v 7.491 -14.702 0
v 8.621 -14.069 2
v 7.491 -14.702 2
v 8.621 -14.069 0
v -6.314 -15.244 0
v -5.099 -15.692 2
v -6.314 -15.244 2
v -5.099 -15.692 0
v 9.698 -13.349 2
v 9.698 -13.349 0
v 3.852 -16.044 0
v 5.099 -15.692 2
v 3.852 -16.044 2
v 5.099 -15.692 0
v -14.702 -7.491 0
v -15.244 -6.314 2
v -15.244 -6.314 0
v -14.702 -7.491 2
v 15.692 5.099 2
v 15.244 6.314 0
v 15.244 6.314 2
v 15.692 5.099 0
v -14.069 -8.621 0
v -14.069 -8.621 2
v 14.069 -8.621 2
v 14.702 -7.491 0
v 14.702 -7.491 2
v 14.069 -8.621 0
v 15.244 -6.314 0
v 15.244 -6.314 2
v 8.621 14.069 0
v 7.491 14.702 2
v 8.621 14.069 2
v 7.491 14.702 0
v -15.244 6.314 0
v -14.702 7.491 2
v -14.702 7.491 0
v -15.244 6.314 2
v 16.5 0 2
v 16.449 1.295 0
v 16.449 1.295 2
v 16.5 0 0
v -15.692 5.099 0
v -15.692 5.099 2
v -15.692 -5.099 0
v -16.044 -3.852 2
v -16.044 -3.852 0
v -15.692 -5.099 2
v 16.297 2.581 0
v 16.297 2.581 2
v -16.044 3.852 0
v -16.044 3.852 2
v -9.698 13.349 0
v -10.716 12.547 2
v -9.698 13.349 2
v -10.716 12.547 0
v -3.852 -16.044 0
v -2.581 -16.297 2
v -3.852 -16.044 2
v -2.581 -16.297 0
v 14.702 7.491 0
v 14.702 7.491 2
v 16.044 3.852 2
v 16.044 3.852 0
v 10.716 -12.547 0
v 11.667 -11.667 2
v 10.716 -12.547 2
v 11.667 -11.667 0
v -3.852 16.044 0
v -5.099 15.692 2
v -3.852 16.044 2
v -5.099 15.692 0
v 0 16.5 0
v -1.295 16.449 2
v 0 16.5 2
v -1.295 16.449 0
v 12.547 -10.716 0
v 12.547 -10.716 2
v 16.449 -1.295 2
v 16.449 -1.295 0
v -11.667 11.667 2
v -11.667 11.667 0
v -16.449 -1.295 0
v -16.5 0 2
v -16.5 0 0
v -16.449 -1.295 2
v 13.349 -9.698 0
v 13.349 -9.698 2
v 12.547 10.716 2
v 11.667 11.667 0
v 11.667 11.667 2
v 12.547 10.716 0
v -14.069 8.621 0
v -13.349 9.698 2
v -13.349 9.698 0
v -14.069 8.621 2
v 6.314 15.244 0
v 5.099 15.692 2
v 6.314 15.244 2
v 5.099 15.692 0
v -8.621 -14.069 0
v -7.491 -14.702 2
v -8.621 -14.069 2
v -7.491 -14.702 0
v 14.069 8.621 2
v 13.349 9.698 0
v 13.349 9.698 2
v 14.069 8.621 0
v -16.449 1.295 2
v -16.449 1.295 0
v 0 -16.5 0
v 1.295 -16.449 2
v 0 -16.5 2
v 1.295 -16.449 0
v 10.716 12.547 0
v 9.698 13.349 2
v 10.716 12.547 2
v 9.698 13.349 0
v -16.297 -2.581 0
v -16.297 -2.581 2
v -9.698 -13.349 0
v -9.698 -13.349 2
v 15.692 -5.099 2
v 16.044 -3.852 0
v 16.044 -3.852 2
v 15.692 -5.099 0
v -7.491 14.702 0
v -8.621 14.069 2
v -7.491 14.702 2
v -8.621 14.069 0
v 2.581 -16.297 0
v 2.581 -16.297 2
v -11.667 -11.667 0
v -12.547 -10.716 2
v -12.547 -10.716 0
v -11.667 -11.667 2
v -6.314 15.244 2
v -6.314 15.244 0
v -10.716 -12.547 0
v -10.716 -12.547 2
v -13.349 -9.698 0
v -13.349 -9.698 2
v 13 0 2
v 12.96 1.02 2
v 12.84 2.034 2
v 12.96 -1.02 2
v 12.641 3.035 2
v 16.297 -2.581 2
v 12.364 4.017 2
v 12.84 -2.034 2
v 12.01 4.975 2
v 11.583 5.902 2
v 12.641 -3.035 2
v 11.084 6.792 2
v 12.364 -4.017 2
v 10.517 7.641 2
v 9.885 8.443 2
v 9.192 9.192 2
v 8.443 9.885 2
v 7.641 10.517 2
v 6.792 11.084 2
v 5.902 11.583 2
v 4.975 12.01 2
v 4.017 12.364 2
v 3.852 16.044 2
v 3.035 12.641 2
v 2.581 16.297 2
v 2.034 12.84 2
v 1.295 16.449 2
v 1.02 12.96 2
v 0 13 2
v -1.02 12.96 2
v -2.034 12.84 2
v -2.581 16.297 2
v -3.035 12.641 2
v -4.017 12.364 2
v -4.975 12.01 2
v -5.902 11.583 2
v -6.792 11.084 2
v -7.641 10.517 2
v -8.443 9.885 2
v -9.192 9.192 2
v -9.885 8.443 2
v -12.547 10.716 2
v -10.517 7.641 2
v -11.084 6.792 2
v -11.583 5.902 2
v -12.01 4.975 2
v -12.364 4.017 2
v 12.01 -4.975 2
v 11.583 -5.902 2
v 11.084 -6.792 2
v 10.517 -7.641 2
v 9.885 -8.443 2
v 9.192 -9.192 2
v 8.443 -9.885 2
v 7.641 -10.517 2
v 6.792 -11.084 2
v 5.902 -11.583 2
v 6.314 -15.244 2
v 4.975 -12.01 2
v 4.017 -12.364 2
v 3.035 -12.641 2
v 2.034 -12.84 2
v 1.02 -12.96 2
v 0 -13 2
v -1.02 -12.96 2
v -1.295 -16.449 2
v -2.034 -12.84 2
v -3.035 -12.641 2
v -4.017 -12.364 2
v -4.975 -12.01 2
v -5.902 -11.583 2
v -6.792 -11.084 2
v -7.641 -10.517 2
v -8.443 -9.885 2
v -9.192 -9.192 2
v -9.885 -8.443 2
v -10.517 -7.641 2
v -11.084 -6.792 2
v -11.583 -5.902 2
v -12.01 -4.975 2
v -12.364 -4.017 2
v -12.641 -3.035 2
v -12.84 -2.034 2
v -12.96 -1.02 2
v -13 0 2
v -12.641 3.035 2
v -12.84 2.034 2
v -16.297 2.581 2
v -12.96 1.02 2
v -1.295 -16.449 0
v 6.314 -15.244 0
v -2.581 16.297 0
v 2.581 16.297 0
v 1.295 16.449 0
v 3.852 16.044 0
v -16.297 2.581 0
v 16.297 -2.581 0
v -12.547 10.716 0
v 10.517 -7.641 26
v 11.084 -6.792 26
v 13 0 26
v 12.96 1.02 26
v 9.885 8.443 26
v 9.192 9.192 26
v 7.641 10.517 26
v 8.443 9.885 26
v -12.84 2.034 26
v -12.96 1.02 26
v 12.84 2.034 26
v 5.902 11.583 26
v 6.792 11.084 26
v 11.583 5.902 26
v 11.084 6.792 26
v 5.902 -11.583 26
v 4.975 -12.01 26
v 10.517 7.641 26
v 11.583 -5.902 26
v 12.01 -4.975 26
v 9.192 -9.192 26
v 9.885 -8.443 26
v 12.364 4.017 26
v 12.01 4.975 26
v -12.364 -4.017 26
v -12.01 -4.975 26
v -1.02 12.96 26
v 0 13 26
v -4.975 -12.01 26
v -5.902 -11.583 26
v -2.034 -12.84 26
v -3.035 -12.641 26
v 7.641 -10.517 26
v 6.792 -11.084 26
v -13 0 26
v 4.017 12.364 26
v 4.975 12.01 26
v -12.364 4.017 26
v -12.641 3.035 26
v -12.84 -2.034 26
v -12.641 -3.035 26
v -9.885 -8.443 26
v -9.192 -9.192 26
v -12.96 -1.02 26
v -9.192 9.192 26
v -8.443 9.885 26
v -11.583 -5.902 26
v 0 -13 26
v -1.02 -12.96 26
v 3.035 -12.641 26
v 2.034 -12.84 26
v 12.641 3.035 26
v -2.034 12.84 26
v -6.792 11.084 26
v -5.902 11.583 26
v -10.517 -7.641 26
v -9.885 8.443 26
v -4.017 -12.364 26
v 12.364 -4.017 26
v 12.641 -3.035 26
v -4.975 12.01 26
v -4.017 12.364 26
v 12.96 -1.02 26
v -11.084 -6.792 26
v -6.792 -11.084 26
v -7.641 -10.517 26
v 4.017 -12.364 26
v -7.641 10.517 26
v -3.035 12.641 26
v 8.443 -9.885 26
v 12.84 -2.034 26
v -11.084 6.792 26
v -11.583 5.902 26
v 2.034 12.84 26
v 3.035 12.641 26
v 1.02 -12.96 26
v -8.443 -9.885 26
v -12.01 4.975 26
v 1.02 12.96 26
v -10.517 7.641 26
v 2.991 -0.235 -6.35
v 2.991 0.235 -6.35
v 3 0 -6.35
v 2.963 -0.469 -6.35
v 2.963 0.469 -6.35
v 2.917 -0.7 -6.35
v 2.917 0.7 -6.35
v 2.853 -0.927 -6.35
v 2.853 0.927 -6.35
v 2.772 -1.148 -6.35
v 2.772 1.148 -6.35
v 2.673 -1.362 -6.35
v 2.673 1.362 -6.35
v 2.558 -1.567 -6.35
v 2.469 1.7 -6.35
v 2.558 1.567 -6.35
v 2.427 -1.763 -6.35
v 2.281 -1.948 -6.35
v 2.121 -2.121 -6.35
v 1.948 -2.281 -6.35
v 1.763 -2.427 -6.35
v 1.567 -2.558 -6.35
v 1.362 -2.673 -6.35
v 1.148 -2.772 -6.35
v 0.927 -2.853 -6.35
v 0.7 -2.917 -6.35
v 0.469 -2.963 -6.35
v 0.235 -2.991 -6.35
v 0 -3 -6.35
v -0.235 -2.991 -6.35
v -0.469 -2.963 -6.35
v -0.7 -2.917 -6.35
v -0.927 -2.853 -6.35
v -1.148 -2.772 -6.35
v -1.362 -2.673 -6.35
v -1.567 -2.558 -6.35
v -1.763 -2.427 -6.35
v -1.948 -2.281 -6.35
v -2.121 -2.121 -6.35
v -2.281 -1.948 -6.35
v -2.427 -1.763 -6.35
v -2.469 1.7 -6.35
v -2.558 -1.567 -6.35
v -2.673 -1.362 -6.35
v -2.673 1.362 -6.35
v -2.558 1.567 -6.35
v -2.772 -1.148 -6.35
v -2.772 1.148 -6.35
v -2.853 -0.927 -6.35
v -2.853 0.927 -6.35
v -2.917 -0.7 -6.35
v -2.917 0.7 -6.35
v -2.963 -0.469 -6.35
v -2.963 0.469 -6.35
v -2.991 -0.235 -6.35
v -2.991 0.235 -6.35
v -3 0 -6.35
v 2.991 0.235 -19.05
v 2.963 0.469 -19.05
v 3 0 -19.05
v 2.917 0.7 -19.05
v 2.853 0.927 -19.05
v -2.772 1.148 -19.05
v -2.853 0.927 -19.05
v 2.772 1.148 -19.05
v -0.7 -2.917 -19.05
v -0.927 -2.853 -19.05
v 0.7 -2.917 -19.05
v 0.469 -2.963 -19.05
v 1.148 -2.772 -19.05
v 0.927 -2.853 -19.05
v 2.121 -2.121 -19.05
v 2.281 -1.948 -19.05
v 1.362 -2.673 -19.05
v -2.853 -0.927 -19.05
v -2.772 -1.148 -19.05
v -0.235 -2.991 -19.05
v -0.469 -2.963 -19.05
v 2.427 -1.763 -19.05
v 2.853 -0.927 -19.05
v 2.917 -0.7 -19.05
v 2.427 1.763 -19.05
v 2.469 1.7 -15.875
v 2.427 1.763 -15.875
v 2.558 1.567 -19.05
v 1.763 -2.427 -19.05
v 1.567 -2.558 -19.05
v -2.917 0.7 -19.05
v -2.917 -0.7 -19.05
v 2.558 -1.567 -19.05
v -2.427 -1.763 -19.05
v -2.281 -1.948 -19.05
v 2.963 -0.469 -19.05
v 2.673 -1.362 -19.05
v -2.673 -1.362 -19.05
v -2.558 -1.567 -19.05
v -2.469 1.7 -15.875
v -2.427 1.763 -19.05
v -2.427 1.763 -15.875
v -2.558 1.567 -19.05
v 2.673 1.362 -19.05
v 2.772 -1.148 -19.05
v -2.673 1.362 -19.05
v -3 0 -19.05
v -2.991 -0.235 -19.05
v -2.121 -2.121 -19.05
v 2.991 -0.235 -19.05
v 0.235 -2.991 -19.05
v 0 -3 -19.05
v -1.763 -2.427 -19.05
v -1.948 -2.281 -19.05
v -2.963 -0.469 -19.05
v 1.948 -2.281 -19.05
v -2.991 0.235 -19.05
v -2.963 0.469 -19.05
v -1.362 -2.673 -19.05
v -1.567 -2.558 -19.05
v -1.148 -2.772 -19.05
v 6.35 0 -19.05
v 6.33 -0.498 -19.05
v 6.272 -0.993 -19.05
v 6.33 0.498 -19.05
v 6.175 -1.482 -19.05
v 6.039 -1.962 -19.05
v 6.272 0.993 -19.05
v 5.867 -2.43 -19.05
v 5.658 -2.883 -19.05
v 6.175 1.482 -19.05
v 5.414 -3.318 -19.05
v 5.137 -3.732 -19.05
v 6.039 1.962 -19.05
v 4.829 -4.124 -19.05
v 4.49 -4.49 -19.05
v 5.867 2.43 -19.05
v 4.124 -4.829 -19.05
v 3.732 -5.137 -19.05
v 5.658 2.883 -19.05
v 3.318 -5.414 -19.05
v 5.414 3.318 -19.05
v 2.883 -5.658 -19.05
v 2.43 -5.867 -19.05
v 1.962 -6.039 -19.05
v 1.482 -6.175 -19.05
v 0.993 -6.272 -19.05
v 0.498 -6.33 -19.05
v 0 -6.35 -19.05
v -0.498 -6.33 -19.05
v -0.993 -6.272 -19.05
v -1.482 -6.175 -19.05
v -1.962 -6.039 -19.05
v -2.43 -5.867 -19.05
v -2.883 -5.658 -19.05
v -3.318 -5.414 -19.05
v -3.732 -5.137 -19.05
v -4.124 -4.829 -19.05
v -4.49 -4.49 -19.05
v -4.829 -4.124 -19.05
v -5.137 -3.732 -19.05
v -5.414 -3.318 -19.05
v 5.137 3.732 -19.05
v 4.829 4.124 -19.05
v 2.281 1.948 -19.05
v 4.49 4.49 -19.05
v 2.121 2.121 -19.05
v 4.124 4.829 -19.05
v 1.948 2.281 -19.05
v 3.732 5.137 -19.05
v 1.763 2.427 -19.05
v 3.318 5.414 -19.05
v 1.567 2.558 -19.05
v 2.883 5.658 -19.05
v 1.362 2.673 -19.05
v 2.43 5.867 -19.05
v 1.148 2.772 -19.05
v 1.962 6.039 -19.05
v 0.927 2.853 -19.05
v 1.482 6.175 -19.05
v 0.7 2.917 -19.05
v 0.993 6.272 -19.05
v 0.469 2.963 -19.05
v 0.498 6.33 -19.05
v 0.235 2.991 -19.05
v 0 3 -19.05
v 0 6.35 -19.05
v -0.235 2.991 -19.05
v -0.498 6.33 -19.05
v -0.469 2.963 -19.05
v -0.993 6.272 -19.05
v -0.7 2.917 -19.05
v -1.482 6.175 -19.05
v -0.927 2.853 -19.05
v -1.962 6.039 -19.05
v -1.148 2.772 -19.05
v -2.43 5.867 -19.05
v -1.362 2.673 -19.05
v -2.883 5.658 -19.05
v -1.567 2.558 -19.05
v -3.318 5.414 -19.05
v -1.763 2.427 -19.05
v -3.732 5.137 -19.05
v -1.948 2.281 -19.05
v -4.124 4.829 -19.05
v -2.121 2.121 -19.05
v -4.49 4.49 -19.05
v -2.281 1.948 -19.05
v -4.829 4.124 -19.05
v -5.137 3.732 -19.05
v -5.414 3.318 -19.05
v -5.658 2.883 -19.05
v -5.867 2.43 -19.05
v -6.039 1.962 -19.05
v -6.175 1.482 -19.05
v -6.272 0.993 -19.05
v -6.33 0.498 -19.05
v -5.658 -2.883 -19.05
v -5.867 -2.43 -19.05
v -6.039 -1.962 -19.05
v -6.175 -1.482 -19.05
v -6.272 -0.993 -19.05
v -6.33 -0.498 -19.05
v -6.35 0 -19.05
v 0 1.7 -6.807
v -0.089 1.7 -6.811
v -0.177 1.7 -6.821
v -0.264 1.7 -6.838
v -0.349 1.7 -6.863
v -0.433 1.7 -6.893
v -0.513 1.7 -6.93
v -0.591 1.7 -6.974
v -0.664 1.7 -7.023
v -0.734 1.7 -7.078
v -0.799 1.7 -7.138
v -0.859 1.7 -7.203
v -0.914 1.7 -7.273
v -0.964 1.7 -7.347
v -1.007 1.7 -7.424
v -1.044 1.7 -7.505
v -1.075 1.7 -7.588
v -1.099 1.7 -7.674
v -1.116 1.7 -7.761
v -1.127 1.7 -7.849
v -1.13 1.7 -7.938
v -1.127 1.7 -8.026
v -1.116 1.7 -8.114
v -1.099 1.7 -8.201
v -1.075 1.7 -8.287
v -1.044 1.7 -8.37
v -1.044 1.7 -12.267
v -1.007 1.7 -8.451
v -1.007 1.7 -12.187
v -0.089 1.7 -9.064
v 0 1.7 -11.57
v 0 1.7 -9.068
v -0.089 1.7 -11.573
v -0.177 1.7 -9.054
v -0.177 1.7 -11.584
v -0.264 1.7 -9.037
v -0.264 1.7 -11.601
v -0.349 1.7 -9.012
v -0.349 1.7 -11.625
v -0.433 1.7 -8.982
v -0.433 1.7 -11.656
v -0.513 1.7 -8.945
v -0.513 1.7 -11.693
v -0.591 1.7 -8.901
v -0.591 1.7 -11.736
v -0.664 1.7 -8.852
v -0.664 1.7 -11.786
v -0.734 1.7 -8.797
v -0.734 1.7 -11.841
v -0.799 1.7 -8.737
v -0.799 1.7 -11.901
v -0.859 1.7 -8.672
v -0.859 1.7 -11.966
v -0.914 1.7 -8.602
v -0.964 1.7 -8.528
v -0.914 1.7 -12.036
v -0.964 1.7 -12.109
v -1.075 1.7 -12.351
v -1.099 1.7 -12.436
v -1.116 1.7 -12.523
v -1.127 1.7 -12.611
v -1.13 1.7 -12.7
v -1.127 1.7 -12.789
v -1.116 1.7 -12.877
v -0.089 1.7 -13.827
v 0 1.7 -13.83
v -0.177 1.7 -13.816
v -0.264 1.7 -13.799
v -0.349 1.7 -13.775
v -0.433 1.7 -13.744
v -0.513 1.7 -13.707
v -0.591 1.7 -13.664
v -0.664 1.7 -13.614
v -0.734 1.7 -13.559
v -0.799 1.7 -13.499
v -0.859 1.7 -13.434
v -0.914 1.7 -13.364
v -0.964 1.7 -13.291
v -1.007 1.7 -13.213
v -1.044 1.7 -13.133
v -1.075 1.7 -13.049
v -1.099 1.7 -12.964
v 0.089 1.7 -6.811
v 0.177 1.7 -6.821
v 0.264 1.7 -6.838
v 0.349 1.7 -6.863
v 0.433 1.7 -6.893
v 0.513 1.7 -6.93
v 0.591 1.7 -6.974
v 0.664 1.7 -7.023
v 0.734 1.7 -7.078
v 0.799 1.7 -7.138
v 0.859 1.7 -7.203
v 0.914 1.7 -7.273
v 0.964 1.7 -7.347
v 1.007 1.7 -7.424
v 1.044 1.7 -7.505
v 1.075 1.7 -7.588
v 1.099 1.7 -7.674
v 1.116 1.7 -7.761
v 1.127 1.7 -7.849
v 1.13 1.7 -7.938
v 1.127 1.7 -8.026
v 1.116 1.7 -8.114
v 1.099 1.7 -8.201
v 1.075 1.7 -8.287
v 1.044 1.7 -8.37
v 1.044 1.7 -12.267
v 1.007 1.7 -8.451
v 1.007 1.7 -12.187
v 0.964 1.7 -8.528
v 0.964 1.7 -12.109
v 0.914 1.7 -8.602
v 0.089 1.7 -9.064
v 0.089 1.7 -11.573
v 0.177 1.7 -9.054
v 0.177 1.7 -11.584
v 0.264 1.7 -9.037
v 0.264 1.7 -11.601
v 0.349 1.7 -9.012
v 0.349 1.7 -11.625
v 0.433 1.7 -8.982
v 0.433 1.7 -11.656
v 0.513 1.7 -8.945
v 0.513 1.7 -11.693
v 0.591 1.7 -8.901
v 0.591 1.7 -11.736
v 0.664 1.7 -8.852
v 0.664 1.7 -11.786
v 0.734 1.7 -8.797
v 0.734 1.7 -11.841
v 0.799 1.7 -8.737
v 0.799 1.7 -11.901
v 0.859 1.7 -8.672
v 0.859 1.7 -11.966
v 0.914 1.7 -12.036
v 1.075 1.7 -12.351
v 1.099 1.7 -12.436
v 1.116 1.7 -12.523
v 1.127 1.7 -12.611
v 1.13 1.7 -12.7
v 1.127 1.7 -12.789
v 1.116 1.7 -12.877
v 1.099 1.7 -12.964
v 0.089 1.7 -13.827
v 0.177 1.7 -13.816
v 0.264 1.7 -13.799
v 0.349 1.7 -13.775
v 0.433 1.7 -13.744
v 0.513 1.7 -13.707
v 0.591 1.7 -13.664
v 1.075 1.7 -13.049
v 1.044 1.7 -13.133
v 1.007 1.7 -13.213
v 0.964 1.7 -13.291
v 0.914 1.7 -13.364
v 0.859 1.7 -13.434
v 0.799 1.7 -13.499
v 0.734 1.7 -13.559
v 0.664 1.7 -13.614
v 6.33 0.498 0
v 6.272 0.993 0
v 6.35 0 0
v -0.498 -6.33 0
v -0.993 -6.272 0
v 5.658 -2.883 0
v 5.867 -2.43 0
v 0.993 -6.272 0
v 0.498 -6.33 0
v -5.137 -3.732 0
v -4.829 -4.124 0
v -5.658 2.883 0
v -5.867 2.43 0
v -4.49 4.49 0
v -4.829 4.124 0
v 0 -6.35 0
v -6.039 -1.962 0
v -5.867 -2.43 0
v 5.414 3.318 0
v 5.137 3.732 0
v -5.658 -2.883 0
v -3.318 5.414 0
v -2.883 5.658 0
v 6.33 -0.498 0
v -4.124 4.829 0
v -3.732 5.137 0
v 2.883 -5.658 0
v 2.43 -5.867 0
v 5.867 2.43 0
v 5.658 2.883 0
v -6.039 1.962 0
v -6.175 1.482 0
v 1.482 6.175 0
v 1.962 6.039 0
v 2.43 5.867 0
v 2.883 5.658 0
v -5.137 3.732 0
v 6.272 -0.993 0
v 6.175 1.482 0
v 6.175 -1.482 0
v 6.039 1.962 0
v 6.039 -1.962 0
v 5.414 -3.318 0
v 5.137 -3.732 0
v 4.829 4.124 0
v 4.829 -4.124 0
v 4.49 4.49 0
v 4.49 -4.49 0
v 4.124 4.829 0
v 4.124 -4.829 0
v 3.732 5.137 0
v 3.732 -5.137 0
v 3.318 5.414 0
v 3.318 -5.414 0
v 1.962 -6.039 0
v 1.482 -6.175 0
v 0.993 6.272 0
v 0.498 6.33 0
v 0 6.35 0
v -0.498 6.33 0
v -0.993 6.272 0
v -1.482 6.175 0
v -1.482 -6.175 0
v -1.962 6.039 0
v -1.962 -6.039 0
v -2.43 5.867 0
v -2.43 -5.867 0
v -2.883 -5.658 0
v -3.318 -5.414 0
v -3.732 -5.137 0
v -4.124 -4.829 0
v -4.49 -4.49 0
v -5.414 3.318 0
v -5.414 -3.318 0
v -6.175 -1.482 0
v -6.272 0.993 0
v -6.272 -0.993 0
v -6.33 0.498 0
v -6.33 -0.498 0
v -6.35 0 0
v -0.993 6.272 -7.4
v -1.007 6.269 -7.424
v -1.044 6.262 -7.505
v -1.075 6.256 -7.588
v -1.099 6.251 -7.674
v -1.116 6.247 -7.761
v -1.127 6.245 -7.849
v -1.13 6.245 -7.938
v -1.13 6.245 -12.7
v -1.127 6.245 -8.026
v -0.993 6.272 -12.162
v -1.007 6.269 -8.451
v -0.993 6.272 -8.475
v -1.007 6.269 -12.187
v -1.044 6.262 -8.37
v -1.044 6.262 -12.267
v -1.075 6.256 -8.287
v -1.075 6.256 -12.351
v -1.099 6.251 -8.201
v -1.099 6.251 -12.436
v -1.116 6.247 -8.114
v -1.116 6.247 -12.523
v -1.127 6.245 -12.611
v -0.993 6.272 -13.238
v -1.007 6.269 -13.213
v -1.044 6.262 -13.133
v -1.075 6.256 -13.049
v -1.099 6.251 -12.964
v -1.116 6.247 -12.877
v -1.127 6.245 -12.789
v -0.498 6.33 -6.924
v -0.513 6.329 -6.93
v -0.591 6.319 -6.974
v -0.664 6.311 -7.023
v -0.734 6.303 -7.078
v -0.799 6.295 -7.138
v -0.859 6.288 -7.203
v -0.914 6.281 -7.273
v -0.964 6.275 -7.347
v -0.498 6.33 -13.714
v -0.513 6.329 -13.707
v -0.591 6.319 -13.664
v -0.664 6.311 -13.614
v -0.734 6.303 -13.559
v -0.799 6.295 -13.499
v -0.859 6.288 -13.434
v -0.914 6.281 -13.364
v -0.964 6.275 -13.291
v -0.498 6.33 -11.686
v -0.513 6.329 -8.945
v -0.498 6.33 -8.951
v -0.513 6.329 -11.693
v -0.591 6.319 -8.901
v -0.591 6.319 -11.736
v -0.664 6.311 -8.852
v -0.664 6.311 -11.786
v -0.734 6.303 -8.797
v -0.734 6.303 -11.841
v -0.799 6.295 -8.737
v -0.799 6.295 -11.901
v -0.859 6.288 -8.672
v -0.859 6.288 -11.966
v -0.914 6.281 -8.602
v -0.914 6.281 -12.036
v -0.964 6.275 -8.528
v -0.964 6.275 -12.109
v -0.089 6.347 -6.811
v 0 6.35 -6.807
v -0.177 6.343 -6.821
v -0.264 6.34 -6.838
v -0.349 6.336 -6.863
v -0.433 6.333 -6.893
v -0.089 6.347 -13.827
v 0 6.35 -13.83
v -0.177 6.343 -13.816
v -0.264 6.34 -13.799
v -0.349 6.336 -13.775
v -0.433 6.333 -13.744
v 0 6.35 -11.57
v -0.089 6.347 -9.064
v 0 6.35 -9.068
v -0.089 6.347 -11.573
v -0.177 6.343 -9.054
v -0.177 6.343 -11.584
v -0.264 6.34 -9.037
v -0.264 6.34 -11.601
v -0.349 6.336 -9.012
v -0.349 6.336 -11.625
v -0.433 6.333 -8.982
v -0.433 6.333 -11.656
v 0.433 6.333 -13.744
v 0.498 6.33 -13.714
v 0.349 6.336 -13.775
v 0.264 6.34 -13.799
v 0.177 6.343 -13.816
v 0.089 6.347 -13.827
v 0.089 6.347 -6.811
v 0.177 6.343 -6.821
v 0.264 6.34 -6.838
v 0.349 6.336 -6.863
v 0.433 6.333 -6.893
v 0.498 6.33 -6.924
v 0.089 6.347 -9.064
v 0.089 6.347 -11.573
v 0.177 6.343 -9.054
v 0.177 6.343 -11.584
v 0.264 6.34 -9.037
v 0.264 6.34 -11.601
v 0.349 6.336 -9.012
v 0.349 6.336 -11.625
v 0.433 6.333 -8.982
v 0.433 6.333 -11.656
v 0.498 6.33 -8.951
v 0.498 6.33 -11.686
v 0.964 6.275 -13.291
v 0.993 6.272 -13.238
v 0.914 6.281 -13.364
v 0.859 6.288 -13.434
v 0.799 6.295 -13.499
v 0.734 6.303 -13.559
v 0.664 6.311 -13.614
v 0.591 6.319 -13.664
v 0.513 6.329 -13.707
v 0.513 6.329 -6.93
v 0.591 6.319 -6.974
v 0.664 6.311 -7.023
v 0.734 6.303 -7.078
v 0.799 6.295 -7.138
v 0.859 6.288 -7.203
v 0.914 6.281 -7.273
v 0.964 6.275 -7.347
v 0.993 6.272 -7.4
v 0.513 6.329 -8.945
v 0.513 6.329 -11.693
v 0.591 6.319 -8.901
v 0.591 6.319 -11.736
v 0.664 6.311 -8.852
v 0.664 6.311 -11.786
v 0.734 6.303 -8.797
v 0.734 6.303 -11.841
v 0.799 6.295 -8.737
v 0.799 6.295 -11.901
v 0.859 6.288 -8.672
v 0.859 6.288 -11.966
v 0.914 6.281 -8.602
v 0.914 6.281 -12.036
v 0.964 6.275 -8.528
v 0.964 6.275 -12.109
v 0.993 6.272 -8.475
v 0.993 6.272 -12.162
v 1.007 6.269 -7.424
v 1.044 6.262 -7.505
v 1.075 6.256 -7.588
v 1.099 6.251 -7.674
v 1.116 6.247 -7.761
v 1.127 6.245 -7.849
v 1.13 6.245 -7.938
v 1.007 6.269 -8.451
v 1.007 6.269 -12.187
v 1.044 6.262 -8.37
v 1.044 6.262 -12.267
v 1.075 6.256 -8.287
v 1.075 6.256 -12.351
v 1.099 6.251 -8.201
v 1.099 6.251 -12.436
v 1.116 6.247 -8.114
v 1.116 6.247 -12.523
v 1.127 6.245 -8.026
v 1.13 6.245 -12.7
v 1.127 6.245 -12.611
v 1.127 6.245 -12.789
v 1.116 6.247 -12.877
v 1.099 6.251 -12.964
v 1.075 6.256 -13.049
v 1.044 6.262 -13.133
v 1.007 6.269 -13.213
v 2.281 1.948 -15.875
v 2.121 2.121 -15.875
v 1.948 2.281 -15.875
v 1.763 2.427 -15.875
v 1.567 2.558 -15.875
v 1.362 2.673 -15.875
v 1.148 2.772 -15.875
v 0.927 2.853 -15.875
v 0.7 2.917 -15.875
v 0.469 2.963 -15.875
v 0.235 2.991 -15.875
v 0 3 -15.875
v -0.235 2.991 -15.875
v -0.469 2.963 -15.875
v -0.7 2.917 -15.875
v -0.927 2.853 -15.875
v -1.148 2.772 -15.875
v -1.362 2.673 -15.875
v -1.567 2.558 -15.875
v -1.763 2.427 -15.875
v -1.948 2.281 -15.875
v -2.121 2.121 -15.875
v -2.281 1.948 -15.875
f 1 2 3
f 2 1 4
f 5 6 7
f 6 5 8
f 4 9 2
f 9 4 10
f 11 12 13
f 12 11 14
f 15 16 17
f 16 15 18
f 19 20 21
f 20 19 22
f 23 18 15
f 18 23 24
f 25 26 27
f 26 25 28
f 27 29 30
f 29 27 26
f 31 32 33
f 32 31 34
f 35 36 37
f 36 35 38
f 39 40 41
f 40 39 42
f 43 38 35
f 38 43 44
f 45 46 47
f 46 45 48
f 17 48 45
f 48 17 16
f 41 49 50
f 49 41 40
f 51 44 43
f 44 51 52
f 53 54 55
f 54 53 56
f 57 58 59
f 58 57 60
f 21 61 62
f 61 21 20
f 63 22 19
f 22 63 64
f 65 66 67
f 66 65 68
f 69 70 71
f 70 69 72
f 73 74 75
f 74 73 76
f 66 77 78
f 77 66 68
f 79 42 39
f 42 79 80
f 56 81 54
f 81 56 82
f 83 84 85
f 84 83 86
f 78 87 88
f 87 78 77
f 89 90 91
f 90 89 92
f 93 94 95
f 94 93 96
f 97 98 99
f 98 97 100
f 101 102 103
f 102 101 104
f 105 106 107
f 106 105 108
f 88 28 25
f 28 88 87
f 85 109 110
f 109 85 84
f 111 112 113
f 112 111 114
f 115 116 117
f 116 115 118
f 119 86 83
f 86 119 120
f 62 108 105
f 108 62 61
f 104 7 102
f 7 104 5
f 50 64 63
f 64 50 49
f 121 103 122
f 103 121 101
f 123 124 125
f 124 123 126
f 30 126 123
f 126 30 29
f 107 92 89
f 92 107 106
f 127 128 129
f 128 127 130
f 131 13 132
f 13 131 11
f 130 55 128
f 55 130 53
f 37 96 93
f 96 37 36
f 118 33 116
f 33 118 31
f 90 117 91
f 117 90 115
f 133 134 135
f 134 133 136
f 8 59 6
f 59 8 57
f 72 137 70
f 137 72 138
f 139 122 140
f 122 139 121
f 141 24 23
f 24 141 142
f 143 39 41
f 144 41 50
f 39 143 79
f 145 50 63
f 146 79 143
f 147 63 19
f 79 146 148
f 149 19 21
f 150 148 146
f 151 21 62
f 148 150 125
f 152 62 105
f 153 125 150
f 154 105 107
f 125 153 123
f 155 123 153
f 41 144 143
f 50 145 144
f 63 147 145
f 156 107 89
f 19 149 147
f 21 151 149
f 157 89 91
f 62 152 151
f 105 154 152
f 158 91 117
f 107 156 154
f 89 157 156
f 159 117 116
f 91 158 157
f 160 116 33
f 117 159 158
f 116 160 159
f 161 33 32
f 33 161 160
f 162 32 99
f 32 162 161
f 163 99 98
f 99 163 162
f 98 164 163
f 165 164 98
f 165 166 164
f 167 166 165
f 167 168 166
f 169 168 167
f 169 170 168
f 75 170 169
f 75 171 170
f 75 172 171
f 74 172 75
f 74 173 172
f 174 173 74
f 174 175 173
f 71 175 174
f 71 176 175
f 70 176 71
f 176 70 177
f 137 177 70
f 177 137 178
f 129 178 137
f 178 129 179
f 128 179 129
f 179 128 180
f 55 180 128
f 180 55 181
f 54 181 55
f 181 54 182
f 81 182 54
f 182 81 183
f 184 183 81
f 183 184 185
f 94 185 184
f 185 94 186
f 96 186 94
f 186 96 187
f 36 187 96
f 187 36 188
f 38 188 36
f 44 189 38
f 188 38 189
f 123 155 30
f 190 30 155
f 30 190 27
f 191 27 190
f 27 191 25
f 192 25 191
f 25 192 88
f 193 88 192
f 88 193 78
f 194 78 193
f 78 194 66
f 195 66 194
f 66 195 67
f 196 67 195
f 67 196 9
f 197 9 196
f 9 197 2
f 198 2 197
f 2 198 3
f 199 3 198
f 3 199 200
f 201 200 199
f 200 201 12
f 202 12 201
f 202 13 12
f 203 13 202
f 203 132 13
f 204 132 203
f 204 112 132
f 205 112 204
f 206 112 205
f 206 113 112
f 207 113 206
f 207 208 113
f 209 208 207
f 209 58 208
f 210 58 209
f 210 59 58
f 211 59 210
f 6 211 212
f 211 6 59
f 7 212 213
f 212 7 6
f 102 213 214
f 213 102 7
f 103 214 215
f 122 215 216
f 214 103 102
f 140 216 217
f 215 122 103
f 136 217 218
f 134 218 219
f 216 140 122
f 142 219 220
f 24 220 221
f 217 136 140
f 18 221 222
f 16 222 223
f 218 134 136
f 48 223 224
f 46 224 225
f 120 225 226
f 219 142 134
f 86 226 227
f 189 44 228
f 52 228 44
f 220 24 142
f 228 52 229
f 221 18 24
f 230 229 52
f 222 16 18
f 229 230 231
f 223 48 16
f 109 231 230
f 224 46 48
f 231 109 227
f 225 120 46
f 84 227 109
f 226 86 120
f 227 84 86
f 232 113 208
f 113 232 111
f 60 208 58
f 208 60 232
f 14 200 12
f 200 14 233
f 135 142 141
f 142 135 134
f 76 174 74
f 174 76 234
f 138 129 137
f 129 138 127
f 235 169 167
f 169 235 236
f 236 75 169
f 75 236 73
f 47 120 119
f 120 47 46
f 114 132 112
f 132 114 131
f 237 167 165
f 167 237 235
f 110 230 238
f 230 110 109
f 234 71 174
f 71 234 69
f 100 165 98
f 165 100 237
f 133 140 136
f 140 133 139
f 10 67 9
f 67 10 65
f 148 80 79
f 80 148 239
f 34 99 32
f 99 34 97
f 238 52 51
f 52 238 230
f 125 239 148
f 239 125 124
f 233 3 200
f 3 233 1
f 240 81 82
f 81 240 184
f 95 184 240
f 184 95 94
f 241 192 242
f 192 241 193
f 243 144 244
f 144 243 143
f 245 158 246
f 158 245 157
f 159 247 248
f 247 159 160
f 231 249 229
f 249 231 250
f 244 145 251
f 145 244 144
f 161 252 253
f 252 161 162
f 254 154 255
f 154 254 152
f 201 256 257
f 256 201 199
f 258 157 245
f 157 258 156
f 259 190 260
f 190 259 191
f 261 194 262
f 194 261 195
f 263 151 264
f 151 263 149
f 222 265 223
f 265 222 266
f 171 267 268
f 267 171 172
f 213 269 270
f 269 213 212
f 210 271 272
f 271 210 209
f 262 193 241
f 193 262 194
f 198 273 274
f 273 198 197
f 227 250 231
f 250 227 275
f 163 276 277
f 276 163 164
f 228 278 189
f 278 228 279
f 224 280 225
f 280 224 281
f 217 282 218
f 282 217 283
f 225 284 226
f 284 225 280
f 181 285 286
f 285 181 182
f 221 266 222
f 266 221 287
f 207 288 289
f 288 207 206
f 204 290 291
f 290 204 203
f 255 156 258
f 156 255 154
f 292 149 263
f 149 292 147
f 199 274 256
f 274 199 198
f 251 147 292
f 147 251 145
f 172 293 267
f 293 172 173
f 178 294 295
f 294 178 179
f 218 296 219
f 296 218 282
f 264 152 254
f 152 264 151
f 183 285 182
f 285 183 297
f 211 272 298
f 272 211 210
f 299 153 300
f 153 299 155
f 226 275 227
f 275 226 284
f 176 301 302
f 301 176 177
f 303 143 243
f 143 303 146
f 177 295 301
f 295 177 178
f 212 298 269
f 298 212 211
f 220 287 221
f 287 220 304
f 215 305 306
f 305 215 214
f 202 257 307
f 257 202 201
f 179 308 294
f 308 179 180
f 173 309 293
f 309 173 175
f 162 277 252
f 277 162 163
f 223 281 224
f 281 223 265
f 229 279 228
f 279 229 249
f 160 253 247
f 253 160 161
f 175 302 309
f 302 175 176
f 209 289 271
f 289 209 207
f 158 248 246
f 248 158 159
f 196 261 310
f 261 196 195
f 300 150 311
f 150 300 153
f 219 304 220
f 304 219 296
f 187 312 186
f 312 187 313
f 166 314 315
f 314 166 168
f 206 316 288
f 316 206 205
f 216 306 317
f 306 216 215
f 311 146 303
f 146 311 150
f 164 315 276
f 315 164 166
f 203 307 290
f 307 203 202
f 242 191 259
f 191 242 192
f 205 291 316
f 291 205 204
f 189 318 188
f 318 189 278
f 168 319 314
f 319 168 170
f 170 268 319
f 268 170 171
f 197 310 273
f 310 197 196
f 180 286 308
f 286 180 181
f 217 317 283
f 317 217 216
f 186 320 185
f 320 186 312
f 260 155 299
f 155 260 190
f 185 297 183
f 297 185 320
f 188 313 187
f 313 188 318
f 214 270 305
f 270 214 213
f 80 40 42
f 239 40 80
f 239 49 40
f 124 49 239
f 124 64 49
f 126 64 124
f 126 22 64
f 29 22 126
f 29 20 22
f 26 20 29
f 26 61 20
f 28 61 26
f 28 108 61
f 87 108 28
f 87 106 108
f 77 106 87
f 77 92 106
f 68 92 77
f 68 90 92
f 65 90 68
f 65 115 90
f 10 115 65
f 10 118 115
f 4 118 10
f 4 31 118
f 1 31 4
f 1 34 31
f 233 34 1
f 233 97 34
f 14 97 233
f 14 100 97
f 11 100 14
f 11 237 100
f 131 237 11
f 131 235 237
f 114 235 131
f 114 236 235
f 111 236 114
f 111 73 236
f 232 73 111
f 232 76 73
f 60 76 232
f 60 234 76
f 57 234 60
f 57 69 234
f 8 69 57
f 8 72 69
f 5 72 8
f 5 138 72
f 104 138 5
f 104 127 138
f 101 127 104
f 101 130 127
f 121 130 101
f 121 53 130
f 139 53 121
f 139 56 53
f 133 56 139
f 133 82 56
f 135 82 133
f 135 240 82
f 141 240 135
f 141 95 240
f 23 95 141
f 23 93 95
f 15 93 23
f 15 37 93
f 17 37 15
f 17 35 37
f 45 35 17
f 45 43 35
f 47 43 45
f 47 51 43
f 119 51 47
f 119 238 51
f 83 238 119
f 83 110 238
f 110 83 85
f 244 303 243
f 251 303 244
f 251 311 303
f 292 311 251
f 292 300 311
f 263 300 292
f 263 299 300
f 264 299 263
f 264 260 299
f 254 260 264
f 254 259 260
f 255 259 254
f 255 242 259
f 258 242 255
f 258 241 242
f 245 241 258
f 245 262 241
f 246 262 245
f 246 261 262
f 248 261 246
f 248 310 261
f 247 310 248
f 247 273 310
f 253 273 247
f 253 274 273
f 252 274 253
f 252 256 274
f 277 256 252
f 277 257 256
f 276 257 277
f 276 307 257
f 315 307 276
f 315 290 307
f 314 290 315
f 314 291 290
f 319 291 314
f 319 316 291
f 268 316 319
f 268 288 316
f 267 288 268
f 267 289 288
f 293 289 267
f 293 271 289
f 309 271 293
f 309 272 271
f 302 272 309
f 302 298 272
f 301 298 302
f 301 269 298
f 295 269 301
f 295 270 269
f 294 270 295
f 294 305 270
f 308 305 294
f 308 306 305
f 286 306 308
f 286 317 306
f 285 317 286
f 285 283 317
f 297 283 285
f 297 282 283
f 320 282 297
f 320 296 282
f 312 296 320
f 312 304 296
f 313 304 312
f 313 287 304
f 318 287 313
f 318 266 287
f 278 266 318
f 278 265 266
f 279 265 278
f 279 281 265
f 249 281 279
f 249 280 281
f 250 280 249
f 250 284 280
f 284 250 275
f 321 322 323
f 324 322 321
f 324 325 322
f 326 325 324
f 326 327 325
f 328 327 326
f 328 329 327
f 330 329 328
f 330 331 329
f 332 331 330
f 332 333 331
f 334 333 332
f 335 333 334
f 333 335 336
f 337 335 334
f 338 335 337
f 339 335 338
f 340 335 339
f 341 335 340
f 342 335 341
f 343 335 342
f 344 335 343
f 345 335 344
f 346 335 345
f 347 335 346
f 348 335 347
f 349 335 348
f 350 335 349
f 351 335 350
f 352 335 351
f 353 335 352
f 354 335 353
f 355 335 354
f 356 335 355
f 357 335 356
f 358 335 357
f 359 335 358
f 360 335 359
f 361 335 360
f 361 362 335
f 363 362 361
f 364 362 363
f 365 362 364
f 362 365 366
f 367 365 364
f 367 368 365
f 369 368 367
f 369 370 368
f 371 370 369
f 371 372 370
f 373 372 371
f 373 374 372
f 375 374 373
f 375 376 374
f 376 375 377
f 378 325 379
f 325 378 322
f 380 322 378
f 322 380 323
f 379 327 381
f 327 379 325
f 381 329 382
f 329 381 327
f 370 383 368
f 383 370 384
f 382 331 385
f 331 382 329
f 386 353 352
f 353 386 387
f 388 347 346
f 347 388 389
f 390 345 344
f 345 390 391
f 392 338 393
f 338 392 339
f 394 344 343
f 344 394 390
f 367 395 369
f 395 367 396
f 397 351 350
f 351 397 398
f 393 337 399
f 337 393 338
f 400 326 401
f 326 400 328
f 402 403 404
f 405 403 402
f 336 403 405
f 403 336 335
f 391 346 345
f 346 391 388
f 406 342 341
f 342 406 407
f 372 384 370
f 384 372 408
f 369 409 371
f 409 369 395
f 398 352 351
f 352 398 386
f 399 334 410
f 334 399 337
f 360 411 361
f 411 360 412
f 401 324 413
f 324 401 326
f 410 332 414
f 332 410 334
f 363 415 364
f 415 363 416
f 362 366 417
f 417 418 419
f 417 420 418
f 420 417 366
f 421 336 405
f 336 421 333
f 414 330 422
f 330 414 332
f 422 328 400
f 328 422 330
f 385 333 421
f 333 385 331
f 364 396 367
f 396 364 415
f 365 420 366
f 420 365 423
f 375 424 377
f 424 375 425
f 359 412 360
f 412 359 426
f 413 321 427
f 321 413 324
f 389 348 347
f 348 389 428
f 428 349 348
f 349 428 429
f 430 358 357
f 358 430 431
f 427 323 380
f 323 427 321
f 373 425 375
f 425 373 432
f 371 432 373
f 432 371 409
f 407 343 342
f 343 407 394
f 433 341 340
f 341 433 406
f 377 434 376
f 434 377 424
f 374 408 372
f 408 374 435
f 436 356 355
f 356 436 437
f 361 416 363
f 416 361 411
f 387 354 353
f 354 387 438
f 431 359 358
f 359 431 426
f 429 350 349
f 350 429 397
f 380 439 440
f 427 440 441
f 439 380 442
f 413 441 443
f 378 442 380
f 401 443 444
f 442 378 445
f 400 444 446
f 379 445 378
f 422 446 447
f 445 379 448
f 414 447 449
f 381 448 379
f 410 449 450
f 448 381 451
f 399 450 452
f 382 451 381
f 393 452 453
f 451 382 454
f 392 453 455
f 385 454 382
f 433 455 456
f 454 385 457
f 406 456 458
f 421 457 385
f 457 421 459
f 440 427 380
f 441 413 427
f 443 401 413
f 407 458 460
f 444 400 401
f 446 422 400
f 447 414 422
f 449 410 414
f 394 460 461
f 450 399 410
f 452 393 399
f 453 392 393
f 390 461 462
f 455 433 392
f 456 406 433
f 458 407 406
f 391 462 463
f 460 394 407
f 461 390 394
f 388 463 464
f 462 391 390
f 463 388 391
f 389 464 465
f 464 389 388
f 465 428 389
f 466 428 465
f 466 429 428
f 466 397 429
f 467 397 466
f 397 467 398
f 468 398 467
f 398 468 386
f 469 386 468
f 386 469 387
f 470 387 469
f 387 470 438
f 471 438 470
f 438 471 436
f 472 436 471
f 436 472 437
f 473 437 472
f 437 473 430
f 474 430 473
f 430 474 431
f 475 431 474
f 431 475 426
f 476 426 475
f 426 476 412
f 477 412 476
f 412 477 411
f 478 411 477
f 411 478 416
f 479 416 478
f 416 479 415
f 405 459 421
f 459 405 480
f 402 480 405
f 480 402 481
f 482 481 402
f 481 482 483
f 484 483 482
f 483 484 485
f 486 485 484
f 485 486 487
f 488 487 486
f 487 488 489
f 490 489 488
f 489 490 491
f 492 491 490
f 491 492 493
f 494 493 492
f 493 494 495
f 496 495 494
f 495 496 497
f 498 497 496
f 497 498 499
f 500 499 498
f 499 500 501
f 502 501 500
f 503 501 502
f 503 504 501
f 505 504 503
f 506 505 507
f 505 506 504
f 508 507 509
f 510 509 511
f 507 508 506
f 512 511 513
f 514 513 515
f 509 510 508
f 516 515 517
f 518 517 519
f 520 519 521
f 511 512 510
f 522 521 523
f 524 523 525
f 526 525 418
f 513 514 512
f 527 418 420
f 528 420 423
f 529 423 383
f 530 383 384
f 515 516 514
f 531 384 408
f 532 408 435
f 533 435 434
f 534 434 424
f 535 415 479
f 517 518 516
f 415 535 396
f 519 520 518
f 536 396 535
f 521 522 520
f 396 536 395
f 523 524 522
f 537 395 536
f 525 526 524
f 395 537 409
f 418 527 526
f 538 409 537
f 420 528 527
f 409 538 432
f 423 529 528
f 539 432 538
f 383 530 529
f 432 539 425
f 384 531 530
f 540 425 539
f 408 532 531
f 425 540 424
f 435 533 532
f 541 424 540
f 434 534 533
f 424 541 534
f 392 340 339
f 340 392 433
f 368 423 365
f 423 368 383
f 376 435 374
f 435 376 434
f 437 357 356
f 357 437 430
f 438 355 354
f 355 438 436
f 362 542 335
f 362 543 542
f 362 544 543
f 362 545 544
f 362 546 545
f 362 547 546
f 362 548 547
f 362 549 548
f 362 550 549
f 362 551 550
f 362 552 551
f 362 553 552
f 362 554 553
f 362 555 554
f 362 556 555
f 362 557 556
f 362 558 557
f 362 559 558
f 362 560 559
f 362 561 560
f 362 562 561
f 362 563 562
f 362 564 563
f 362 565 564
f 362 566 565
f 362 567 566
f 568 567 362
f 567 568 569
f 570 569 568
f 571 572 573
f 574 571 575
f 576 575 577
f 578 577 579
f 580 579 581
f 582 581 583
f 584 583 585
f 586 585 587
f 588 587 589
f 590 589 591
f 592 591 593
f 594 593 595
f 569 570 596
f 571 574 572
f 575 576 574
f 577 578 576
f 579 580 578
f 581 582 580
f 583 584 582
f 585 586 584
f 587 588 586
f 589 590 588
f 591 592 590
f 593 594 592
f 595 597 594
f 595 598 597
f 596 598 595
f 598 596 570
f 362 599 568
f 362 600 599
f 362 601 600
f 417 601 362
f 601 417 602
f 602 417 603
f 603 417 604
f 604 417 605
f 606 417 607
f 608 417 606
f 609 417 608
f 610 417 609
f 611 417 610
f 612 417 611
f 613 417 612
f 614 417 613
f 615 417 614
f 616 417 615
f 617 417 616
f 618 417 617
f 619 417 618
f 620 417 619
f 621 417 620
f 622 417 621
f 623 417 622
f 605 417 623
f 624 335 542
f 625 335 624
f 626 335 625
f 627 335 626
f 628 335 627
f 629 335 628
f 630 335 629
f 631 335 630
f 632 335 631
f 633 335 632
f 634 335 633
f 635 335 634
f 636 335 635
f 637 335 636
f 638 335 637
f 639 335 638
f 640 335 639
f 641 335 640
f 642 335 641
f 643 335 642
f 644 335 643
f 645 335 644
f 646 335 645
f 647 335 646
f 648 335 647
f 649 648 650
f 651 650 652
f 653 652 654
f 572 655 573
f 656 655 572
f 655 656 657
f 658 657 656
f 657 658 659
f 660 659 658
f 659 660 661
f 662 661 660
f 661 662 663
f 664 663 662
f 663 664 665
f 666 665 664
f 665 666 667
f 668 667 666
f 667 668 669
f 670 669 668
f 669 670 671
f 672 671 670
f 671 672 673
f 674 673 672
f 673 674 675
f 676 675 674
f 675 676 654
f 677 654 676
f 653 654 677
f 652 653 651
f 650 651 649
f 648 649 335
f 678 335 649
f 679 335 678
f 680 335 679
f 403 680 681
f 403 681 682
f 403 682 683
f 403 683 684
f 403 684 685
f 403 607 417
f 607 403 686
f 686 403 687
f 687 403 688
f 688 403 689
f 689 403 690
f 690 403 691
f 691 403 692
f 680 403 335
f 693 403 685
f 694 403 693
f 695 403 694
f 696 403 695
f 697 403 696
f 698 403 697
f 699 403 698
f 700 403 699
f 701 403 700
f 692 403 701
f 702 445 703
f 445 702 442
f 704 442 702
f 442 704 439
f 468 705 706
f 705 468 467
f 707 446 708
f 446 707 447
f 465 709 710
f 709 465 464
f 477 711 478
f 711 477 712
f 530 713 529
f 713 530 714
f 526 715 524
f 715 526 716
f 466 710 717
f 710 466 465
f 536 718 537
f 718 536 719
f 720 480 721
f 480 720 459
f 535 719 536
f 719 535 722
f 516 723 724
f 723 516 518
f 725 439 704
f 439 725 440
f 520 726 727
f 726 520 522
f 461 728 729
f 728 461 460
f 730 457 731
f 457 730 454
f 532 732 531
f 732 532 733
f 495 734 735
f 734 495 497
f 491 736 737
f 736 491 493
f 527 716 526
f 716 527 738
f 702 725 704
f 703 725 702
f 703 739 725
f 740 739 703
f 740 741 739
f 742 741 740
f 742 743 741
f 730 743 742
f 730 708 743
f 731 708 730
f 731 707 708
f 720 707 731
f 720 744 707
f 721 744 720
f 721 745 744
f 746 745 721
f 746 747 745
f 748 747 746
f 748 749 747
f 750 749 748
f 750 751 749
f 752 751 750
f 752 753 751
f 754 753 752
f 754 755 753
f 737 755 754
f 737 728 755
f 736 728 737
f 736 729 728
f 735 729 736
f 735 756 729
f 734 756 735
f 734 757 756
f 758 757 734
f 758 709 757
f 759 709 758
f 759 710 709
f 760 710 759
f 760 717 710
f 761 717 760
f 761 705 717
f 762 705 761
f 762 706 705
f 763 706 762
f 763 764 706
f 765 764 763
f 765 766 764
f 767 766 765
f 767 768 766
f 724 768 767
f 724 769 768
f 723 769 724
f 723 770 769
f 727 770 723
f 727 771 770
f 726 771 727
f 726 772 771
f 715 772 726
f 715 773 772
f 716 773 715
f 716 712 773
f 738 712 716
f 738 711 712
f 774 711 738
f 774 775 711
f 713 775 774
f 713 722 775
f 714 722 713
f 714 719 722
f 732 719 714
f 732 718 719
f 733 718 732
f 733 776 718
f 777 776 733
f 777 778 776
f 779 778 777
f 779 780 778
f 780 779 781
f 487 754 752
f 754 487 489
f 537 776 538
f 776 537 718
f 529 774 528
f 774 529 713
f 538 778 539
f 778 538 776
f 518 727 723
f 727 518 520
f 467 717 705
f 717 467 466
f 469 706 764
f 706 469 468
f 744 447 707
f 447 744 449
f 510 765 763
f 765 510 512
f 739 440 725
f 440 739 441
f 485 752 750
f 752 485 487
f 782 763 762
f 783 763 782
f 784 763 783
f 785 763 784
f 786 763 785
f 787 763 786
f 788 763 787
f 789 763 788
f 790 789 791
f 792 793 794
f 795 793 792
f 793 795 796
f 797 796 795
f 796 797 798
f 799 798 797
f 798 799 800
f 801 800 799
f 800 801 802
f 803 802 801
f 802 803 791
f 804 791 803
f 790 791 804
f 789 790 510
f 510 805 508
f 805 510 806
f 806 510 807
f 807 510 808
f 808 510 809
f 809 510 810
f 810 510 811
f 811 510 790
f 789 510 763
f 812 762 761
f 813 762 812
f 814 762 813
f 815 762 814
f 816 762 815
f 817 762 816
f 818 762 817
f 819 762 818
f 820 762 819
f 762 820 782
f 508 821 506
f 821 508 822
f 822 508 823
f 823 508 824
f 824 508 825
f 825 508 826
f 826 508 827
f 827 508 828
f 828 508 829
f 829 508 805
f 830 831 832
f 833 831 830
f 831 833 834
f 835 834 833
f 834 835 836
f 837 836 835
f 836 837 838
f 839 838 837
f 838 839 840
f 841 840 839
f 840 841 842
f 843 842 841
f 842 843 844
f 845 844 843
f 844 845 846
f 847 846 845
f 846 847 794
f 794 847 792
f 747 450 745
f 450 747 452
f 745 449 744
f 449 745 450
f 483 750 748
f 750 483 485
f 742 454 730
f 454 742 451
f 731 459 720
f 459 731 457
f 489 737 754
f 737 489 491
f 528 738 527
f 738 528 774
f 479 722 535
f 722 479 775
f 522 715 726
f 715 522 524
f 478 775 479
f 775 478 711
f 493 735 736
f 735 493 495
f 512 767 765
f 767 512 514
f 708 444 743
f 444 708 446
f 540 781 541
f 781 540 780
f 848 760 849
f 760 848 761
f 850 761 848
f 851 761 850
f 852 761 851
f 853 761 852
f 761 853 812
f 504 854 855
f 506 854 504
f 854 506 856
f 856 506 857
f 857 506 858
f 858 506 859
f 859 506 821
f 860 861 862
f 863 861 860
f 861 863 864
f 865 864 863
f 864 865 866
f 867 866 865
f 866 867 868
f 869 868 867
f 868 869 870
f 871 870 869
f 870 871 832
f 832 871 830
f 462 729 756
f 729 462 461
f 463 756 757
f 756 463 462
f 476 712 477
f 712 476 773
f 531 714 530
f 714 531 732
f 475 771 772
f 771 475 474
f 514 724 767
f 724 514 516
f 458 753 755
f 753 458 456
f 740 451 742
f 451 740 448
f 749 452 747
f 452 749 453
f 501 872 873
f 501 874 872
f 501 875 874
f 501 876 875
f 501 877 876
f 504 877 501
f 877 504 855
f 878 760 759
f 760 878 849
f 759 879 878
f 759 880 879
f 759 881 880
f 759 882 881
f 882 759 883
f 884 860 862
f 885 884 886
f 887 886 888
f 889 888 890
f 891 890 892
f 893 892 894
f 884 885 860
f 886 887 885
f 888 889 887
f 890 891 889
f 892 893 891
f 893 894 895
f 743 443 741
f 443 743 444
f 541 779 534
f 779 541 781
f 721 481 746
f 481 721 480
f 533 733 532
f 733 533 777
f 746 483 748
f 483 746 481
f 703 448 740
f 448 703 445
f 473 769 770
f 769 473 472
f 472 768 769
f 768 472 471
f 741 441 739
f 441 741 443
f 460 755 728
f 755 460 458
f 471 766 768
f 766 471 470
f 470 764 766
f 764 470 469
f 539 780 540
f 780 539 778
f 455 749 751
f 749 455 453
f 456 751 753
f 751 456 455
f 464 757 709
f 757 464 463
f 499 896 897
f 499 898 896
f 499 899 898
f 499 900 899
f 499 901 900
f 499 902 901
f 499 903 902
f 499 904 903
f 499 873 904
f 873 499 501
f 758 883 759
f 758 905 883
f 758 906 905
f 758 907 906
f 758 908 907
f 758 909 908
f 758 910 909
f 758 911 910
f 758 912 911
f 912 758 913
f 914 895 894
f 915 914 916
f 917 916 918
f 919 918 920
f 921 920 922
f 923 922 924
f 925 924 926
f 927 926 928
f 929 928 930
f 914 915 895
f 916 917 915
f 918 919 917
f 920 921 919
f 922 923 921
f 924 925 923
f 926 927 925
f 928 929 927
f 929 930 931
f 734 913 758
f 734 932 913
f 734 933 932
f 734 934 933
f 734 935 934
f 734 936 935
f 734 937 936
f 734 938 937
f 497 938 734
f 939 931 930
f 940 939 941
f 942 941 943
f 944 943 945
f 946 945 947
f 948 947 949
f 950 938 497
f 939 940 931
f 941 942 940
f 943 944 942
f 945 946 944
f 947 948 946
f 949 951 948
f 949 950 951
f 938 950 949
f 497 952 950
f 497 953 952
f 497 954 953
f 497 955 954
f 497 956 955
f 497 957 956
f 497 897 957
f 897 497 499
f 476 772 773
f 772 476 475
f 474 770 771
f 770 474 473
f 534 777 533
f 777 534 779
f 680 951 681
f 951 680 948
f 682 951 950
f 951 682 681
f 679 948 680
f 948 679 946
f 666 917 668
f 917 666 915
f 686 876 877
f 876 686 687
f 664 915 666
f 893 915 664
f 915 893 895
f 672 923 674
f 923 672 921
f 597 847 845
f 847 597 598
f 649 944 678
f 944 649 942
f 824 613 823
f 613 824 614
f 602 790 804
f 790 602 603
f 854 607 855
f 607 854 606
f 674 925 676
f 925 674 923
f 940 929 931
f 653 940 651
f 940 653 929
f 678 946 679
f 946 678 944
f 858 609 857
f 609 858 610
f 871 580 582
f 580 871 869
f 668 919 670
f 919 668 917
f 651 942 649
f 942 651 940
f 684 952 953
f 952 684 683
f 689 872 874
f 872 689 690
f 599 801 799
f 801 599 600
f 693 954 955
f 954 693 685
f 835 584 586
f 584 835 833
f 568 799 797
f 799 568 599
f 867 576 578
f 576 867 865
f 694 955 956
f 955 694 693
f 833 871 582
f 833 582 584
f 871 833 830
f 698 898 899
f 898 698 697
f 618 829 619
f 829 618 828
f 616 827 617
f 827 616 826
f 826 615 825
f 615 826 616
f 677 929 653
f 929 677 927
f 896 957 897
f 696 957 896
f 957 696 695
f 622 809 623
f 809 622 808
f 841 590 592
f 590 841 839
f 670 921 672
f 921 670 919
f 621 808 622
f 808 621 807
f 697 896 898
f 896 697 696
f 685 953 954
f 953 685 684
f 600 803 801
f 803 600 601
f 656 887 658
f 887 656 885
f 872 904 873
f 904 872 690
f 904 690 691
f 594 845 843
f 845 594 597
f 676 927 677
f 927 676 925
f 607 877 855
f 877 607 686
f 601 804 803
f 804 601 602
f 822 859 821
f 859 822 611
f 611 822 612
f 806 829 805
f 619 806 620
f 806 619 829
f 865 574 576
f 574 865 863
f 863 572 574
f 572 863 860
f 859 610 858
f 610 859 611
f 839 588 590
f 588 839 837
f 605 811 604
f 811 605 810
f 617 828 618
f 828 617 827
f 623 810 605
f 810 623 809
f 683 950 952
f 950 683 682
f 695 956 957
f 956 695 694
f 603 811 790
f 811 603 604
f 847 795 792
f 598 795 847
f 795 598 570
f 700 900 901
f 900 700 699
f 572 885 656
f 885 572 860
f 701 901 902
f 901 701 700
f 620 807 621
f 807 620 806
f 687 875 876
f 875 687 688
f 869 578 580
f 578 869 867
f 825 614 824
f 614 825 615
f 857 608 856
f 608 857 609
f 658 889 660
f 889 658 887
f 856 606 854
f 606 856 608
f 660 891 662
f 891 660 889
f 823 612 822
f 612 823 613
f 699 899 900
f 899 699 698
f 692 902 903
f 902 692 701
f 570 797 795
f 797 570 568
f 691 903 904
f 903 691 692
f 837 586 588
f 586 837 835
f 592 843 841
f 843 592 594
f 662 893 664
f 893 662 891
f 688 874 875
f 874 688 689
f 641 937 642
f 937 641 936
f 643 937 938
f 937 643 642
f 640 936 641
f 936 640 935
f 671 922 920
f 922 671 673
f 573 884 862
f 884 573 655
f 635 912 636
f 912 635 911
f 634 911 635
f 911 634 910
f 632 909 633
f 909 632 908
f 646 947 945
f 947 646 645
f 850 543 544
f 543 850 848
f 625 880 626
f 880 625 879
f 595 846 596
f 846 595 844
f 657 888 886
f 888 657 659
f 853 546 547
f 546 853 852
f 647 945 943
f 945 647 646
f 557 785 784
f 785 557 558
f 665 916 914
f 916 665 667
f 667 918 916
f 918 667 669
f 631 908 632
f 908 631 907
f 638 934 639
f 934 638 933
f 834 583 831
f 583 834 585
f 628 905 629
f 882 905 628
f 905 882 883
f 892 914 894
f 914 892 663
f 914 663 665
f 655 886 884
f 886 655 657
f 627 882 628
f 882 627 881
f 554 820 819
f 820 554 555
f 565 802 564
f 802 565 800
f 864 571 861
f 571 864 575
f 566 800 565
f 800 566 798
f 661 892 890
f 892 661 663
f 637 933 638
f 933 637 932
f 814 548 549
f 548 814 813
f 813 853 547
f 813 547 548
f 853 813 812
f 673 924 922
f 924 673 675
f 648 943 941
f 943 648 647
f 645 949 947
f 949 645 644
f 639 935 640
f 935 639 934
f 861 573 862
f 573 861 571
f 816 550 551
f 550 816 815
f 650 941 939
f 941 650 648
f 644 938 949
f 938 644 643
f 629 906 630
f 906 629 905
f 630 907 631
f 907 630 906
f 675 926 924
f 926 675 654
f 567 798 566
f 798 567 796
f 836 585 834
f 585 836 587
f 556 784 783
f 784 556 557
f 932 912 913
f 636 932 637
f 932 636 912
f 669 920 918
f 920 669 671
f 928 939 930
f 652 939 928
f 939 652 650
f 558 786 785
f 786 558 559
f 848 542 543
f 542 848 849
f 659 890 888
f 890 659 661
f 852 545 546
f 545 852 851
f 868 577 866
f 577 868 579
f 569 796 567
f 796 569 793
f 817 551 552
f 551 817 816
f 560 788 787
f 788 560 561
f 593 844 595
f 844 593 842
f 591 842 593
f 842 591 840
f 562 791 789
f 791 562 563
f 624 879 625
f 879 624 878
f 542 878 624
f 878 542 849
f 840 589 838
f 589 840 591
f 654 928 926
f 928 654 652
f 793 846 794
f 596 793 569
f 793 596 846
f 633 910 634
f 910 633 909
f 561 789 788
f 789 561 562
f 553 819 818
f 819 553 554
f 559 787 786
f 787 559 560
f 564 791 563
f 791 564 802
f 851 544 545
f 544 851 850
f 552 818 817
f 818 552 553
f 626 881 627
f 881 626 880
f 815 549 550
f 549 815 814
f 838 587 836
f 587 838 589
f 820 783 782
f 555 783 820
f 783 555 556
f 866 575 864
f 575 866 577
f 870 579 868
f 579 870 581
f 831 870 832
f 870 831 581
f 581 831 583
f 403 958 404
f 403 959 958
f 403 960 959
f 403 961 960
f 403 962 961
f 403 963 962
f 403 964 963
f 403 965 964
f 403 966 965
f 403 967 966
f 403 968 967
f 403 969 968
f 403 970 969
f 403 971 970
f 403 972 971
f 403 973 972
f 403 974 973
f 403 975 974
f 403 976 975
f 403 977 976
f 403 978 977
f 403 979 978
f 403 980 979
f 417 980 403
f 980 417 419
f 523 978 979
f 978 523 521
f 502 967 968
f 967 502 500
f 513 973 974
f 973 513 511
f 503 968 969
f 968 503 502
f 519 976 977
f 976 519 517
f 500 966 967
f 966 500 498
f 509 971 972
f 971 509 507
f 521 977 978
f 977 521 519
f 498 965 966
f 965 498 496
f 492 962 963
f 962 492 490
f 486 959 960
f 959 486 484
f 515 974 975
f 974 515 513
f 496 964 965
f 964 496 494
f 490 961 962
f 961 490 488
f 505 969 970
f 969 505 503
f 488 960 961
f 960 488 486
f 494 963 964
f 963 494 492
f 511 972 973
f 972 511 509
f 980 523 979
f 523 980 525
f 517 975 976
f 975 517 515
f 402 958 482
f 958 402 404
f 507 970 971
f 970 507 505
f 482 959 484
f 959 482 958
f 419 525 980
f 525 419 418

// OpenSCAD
$fn = 80;

difference(){
    cylinder(d=33,h=26);
    translate([0,0,2])difference(){
        cylinder(d=33,h=26);
        cylinder(d=26,h=26);
}
}
translate([0,0,-25.4*3/4])difference(){
        cylinder(r=25.4/2/2,h=25.4*3/4);
        difference(){
            cylinder(r=3,h=25.4/2);
            translate([-4.944/2,1.7,0])cube([4.944,1.3,25.4*2/4],0);
        }
 translate([0,25.4/2/2,25.4*1/4])rotate([90,0,0])cylinder(d=2.2606,h=4.65);
        translate([0,25.4/2/2,25.4*7/16])rotate([90,0,0])cylinder(d=2.2606,h=4.65);
        
    cylinder(r=3,h=25.4*1/8);
}
